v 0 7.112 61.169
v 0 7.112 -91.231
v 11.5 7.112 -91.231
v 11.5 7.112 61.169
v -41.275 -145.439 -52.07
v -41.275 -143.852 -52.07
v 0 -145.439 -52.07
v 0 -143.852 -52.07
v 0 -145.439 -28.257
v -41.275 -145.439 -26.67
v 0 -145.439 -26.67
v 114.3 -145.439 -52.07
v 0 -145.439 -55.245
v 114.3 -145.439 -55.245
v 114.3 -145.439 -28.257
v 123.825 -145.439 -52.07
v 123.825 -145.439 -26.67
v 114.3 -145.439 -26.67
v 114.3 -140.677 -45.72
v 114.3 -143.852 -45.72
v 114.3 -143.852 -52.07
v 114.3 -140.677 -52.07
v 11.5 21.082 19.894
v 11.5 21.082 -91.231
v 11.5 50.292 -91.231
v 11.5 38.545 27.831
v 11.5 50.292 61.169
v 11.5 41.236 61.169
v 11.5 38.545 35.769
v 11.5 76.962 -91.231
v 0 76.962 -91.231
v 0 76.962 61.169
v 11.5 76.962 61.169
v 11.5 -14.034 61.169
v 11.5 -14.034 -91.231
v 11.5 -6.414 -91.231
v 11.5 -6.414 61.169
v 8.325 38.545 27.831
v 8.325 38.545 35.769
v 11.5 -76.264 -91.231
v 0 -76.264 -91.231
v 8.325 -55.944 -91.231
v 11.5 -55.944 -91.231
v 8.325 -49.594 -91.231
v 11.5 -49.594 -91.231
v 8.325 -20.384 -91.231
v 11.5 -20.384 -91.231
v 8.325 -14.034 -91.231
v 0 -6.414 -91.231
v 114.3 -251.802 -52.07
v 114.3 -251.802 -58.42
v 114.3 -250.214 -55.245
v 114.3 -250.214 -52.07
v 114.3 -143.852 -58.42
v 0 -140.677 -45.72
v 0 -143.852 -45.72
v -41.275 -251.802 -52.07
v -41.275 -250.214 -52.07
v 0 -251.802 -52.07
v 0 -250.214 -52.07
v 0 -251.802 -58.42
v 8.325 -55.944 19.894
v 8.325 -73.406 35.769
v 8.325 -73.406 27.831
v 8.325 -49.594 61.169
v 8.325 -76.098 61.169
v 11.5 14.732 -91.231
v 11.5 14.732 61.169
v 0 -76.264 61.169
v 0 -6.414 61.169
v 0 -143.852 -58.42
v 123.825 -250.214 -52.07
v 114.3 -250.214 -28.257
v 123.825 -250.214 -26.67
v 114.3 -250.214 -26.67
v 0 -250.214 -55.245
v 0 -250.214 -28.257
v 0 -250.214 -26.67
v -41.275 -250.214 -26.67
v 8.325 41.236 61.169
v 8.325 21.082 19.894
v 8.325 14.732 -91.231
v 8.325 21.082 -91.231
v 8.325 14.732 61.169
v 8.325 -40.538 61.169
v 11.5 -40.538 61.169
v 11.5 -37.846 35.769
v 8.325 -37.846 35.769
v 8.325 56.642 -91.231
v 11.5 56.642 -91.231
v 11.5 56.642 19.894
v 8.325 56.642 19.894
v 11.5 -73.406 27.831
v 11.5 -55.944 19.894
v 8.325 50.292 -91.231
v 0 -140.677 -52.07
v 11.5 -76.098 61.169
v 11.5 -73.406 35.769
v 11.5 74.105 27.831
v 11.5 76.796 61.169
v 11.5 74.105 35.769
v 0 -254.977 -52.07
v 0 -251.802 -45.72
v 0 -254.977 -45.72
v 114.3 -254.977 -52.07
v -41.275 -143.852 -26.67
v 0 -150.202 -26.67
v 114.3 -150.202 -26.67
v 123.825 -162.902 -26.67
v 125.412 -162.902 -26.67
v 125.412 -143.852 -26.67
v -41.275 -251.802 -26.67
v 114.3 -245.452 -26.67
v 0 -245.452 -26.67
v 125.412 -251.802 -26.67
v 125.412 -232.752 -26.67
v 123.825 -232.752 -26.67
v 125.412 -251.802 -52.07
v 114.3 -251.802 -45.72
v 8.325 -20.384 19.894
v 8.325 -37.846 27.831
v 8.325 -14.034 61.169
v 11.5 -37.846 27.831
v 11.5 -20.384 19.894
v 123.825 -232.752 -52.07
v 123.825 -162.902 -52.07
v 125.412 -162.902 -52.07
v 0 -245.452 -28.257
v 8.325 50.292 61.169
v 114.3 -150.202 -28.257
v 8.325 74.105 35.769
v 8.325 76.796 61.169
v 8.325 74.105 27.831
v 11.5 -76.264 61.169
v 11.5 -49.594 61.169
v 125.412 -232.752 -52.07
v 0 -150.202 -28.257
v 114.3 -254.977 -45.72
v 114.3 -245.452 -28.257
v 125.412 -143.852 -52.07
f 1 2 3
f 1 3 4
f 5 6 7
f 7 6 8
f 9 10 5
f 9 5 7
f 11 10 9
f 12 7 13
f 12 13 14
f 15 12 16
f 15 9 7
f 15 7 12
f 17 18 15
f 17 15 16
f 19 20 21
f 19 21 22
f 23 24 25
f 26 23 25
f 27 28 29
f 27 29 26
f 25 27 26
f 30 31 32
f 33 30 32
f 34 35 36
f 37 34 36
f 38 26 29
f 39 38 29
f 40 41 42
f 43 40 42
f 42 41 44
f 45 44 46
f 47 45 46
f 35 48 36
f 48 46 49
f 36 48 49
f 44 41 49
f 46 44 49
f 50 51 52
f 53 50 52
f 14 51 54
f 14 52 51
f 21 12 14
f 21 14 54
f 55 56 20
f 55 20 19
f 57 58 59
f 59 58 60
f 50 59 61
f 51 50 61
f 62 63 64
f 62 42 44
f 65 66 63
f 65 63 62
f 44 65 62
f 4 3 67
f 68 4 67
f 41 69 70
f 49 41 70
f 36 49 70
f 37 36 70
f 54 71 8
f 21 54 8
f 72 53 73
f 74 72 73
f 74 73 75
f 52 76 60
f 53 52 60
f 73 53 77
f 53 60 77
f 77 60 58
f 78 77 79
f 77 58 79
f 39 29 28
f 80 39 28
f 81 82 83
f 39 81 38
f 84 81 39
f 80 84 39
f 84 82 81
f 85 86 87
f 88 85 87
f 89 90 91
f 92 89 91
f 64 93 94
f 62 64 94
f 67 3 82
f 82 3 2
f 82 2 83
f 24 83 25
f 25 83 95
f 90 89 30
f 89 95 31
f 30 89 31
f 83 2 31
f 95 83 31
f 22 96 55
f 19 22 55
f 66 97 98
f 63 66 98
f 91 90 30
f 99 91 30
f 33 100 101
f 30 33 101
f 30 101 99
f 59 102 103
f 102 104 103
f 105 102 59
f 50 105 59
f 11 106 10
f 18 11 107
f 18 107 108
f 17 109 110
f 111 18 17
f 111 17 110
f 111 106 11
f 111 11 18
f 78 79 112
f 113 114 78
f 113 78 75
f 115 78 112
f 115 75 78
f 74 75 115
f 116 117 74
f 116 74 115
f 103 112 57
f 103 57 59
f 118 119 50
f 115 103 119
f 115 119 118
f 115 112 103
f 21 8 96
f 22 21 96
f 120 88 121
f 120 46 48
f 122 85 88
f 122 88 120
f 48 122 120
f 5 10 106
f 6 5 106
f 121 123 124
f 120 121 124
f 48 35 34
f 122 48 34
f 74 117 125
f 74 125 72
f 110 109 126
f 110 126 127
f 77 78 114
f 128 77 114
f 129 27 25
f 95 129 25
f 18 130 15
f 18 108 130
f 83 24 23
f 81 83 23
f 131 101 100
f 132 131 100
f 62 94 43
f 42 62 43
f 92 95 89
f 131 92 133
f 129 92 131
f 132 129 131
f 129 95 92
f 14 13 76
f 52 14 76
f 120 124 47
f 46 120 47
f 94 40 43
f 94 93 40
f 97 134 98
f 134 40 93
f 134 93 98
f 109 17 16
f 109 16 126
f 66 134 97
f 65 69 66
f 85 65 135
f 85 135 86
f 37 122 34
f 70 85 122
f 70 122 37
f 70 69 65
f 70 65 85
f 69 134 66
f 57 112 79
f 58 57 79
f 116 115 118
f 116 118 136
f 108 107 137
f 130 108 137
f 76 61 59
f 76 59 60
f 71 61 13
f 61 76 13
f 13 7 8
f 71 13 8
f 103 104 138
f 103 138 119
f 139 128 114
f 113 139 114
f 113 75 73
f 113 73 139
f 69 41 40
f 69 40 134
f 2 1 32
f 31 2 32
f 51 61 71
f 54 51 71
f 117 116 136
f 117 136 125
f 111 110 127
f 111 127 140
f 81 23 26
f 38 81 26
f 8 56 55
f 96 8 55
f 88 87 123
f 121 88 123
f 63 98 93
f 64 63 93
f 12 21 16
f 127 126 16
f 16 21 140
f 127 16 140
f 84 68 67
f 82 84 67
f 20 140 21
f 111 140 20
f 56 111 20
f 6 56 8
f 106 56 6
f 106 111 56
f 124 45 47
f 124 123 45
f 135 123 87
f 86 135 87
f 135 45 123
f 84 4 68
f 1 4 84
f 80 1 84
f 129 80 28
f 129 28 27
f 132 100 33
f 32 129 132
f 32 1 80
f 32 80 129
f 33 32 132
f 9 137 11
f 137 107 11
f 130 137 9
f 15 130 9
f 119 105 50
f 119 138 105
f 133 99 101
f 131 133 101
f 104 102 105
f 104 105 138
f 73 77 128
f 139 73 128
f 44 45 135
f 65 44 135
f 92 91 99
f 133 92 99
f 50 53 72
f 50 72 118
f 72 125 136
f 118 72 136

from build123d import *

# Parameters (mm, degrees)
F0_W     = 69.85
F0_H     = 152.4
F1_DEPTH = 11.5
F3_DEPTH = 3.175
F4_W     = 3.175
F4_H     = 6.35
F5_DEPTH = 114.3
F6_W     = 41.275
F6_H     = 1.5875
F7_DEPTH = 25.4


with BuildPart() as f1:
    # F0 (on Right) → F1 (new body)
    with BuildSketch(Plane.YZ):
        with Locations((-41.338587, -15.031421)):
            Rectangle(F0_W, F0_H)
        with Locations((42.037002, -15.031421)):
            Rectangle(F0_W, F0_H)
    extrude(amount=F1_DEPTH)

    # F2 (on face) → F3 (cut)
    with BuildSketch(Plane.YZ.offset(11.5)):
        Polygon((-49.593587, 61.168579), (-55.943587, 61.168579), (-55.943587, 19.893579), (-55.943587, -91.231421), (-49.593587, -91.231421), align=None)
        Polygon((-55.943587, 19.893579), (-55.943587, 61.168579), (-76.097585, 61.168579), (-73.406087, 35.768579), (-73.406087, 27.831079), align=None)
        Polygon((56.642002, 61.168579), (50.292002, 61.168579), (50.292002, -91.231421), (56.642002, -91.231421), (56.642002, 19.893579), align=None)
        Polygon((76.795999, 61.168579), (56.642002, 61.168579), (56.642002, 19.893579), (74.104502, 27.831079), (74.104502, 35.768579), align=None)
        Polygon((-14.033587, -91.231421), (-14.033587, 61.168579), (-20.383587, 61.168579), (-20.383587, 19.893579), (-20.383587, -91.231421), align=None)
        Polygon((-20.383587, 19.893579), (-20.383587, 61.168579), (-40.537585, 61.168579), (-37.846087, 35.768579), (-37.846087, 27.831079), align=None)
        Polygon((21.082002, 19.893579), (21.082002, 61.168579), (14.732002, 61.168579), (14.732002, -91.231421), (21.082002, -91.231421), align=None)
        Polygon((41.235999, 61.168579), (21.082002, 61.168579), (21.082002, 19.893579), (38.544502, 27.831079), (38.544502, 35.768579), align=None)
    extrude(amount=-F3_DEPTH, mode=Mode.SUBTRACT)


with BuildPart() as f5:
    # F4 (on Right) → F5 (new body)
    with BuildSketch(Plane.YZ):
        Polygon((-250.214378, -28.257499), (-245.451878, -28.257499), (-245.451878, -26.669999), (-251.801878, -26.669999), (-251.801878, -45.719999), (-251.801878, -52.069999), (-251.801878, -58.419999), (-143.851878, -58.419999), (-143.851878, -52.069999), (-143.851878, -45.719999), (-143.851878, -26.669999), (-150.201878, -26.669999), (-150.201878, -28.257499), (-145.439378, -28.257499), (-145.439378, -55.244999), (-250.214378, -55.244999), align=None)
        with Locations((-253.389378, -48.894999)):
            Rectangle(F4_W, F4_H)
        with Locations((-142.264378, -48.894999)):
            Rectangle(F4_W, F4_H)
    extrude(amount=F5_DEPTH)

    # F6 (on face) → F7 (join)
    with BuildSketch(Plane.XY.offset(-26.669999)):
        Polygon((125.4125, -143.851878), (114.3, -143.851878), (114.3, -145.439378), (123.825, -145.439378), (123.825, -162.901878), (125.4125, -162.901878), align=None)
        Polygon((114.3, -250.214378), (114.3, -251.801878), (125.4125, -251.801878), (125.4125, -232.751878), (123.825, -232.751878), (123.825, -250.214378), align=None)
        with Locations((-20.6375, -144.645628)):
            Rectangle(F6_W, F6_H)
        with Locations((-20.6375, -251.008128)):
            Rectangle(F6_W, F6_H)
    extrude(amount=-F7_DEPTH)


solid = Compound([f1.part, f5.part])
